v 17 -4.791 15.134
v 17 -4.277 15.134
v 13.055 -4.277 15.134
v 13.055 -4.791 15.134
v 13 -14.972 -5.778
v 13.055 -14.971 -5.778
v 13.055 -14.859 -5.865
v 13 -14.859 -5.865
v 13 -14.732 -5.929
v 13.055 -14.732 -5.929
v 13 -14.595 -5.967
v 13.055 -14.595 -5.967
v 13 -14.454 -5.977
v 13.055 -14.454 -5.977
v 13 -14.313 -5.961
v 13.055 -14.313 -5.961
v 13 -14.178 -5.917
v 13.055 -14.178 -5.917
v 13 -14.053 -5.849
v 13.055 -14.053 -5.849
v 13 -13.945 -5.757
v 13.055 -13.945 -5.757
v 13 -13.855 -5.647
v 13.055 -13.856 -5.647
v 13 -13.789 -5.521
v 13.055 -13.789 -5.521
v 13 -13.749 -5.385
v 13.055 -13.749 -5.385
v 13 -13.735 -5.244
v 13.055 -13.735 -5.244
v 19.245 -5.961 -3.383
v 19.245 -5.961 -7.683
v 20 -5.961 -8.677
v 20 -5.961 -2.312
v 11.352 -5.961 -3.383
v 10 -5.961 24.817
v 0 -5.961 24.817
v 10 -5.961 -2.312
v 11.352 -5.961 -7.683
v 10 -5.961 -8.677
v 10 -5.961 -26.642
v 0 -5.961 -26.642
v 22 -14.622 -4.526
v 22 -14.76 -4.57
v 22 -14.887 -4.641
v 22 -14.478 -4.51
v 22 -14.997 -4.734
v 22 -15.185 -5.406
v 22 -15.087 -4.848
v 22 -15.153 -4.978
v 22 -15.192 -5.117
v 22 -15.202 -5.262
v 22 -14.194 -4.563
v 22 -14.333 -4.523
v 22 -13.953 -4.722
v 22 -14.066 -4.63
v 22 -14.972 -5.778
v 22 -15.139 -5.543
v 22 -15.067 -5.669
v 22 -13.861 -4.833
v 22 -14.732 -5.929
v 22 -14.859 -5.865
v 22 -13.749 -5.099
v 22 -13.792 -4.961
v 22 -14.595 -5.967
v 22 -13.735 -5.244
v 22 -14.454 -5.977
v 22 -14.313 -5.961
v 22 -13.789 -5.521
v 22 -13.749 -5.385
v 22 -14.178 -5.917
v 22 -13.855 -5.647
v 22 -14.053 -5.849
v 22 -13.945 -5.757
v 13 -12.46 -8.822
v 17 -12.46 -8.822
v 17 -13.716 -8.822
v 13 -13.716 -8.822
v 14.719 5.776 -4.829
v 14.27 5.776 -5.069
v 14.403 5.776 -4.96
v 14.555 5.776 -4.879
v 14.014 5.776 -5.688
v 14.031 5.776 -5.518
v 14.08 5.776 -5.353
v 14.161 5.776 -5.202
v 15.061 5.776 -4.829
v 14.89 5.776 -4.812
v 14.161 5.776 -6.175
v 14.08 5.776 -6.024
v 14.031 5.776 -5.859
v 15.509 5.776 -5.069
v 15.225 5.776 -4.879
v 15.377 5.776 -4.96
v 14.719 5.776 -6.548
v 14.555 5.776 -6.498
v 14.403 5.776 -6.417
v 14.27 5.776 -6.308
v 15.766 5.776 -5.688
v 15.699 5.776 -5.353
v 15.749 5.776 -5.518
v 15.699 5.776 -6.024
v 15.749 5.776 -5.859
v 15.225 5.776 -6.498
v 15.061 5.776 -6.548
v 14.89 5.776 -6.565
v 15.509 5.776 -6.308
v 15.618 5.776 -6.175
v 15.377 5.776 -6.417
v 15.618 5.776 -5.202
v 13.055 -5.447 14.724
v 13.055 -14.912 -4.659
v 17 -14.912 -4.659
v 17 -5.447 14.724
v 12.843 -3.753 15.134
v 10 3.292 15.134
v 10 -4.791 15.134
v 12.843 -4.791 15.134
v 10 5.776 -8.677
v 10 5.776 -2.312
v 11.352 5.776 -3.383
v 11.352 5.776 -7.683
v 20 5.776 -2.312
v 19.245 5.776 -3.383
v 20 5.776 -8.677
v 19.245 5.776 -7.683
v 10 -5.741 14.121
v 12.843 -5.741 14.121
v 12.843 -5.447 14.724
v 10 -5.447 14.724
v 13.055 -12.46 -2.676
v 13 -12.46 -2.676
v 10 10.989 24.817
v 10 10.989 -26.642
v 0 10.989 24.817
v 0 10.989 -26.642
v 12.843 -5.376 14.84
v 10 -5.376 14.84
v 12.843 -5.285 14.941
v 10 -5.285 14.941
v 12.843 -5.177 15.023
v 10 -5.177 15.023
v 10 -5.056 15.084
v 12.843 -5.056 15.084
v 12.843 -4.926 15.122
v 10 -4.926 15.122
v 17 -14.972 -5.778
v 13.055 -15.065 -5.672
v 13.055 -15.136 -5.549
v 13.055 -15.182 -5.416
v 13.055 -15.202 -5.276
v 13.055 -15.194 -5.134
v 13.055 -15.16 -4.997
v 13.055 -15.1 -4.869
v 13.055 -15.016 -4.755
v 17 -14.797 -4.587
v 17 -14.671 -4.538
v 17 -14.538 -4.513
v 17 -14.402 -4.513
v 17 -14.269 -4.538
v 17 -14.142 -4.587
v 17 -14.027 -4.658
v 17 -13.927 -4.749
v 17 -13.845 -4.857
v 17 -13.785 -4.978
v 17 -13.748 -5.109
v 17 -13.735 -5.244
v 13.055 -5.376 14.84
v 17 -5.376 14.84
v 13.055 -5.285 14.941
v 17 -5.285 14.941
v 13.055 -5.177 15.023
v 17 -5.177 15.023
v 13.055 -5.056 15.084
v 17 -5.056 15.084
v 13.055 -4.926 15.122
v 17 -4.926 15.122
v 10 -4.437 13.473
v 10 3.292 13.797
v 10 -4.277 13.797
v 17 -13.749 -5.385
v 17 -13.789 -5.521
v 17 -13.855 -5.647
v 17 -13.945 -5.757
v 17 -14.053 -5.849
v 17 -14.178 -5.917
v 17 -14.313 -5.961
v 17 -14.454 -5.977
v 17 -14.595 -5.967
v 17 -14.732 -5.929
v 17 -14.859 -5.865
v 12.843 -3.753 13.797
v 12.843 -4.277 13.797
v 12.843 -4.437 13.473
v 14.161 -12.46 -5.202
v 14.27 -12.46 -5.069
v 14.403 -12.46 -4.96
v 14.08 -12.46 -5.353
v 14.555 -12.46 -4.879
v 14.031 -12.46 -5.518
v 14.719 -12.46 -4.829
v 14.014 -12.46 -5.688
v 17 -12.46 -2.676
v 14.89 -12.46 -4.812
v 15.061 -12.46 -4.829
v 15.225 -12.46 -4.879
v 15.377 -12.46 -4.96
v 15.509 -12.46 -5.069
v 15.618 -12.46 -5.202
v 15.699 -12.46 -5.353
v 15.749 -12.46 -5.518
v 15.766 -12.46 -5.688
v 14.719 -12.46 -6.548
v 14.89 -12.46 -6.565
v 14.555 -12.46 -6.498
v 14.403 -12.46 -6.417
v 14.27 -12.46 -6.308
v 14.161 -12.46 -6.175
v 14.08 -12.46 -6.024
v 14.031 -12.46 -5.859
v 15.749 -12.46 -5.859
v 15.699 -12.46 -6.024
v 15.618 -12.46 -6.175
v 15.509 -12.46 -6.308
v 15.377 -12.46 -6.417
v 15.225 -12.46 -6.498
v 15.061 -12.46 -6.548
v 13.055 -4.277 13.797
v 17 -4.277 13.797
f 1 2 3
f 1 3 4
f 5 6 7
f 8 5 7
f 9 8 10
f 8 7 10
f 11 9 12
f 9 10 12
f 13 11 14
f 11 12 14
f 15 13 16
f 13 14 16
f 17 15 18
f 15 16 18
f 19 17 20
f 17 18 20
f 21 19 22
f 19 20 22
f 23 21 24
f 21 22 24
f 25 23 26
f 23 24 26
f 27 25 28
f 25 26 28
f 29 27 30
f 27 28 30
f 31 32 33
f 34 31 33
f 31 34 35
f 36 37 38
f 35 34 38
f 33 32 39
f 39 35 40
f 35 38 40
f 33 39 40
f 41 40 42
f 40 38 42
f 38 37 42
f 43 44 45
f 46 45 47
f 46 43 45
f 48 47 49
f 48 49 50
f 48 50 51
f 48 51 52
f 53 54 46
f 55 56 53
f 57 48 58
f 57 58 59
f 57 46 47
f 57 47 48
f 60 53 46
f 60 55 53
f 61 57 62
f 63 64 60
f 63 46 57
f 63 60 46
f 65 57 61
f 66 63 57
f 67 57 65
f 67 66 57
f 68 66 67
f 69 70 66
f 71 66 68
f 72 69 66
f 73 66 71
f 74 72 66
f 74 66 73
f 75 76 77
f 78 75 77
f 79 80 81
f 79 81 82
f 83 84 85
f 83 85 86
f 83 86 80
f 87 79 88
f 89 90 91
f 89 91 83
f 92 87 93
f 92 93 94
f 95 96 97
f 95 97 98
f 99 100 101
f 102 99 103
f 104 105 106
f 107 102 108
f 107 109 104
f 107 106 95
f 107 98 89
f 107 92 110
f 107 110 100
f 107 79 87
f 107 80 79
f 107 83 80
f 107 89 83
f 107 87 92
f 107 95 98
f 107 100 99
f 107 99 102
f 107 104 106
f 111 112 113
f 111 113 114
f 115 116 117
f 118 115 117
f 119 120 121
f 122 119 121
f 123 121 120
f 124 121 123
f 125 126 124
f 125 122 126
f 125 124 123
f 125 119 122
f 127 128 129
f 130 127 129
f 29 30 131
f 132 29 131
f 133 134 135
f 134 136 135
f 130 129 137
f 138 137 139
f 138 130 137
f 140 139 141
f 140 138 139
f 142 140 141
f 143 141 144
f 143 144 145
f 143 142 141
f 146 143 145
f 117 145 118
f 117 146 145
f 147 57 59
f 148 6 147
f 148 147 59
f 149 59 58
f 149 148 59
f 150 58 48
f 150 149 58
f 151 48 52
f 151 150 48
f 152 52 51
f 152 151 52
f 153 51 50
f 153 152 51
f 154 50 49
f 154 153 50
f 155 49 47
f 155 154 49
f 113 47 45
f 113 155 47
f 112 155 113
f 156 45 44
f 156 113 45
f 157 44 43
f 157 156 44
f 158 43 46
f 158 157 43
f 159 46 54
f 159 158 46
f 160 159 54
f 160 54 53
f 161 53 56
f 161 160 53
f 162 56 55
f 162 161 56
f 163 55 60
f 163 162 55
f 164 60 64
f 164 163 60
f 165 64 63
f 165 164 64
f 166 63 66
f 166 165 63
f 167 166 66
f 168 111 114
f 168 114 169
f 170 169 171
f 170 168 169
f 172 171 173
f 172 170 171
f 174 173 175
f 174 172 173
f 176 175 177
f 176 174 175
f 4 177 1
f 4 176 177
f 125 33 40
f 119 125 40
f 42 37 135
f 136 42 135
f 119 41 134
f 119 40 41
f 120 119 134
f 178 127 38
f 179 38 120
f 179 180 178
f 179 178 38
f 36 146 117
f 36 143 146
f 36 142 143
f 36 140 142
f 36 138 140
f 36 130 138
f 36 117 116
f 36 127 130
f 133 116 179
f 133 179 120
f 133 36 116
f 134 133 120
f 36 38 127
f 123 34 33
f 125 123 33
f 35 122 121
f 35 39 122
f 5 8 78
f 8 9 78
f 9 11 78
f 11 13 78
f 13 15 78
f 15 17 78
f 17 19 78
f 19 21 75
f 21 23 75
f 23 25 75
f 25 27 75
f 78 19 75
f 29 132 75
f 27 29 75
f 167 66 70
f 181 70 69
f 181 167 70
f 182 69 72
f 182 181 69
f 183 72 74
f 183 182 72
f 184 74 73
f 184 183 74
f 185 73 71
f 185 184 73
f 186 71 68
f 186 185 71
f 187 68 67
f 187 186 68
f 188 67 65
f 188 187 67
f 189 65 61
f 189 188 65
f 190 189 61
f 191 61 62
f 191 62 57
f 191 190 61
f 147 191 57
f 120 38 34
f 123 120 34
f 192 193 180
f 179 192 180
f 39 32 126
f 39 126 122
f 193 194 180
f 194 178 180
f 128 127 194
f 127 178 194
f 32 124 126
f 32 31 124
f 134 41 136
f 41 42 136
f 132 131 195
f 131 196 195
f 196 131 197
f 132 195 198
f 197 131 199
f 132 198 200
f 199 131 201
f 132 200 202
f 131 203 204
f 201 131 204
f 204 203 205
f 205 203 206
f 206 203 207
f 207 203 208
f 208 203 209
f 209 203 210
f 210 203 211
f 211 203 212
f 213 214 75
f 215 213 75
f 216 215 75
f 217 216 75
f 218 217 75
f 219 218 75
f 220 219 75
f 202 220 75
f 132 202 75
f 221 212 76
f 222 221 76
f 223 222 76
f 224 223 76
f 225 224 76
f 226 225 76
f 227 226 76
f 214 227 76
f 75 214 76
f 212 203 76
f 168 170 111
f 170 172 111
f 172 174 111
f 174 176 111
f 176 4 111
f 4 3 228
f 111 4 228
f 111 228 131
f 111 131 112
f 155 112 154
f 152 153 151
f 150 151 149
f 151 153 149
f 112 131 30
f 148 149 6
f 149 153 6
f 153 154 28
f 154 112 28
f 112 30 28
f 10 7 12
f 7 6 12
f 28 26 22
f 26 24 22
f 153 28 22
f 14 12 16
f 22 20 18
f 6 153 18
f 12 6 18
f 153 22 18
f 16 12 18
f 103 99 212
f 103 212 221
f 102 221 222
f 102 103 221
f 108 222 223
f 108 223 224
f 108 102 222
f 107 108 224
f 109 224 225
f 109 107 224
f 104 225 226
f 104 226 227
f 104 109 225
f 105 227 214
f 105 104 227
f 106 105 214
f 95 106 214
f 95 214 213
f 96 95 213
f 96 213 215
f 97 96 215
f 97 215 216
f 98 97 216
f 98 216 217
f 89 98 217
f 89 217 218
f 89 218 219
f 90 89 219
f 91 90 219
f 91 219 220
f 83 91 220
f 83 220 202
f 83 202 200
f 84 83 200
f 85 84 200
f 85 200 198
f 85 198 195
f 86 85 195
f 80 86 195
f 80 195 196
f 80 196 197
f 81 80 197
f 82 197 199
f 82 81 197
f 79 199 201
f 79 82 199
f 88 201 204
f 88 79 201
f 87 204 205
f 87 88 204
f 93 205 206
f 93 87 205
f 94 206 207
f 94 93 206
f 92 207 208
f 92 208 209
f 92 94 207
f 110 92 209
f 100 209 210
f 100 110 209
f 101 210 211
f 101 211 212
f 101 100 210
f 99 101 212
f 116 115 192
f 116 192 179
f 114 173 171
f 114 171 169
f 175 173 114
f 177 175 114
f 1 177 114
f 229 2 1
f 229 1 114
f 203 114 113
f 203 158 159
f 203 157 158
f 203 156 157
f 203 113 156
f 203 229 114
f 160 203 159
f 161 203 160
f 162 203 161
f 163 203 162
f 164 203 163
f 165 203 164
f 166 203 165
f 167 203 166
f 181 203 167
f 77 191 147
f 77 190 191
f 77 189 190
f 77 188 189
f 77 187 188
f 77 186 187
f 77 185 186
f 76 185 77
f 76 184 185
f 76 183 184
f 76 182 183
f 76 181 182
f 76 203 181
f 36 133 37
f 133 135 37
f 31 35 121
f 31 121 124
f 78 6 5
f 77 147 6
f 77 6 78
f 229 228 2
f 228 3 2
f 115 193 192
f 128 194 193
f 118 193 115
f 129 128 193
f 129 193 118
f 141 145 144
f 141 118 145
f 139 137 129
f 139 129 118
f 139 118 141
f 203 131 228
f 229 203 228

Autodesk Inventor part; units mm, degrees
ref_plane "YZ Plane" through (0, 0, 0) normal (1, 0, 0) x (0, 1, 0)
ref_plane "XZ Plane" through (0, 0, 0) normal (0, 1, 0) x (-1, 0, 0)
ref_plane "XY Plane" through (0, 0, 0) normal (0, 0, 1) x (1, 0, 0)
sketch "Эскиз1" plane through (0, 0, 0) normal (1, 0, 0) x (0, 1, 0)
  line L0 (10.9892, 24.817) -> (-5.9609, 24.817)
  line L1 (-5.9609, 24.817) -> (-5.9609, -26.6418)
  line L2 (-5.9609, -26.6418) -> (10.9892, -26.6418)
  line L3 (10.9892, -26.6418) -> (10.9892, 24.817)
  point P0 (0, 0)
extrude "Выдавливание1" add sketch "Эскиз1" along normal blind 10
sketch "Эскиз2" plane through (10, 0, 0) normal (1, 0, 0) x (0, 0, -1)
  line L0 (-24.817, -5.9609) -> (26.6418, -5.9609) projected
  line L1 (8.6766, -5.9609) -> (2.3125, -5.9609)
  line L2 (2.3125, -5.9609) -> (2.3125, -4.2236)
  line L3 (2.3125, -4.2236) -> (8.6766, -4.2236)
  line L4 (8.6766, -4.2236) -> (8.6766, -5.9609)
  point P0 (0, 0)
extrude "Выдавливание2" add sketch "Эскиз2" along normal blind 10
sketch "Эскиз3" plane through (10, -4.2236, -2.3125) normal (0, 1, 0) x (1, 0, 0)
  line L0 (9.2453, 5.3703) -> (1.3522, 5.3703)
  line L1 (1.3522, 5.3703) -> (1.3522, 1.0702)
  line L2 (1.3522, 1.0702) -> (9.2453, 1.0702)
  line L3 (9.2453, 1.0702) -> (9.2453, 5.3703)
  point P0 (-10, -2.3125)
extrude "Выдавливание3" cut sketch "Эскиз3" against normal blind 10
sketch "Эскиз4" plane through (10, 0, 0) normal (1, 0, 0) x (0, 0, -1)
  circle A0 centre (-14.404, -4.7906) radius 0.7303
  circle A1 centre (5.2437, -14.4688) radius 0.7338
  line L0 (5.2437, -13.7349) -> (-14.0791, -4.1365)
  line L1 (4.6589, -14.9121) -> (-14.7245, -5.4468)
  point P0 (0, 0)
extrude "Выдавливание4" add sketch "Эскиз4" along normal blind 7
sketch "Эскиз5" plane through (10, -4.1365, 14.0791) normal (0, 0.8955929, -0.4448745) x (1, 0, 0)
  line L0 (0, 29.7403) -> (0, -16.3458) projected
  line L1 (0, 0.6764) -> (3.0548, 0.6764)
  line L2 (3.0548, 0.6764) -> (3.0548, 24.6626)
  line L3 (3.0548, 24.6626) -> (0, 24.6626)
  line L4 (0, 24.6626) -> (0, 0.6764)
  point P0 (-10, 10.7689)
  point P1 (0, 24.6626)
extrude "Выдавливание5" cut sketch "Эскиз5" against normal mid plane 10
sketch "Эскиз6" plane through (10, -4.2236, -2.3125) normal (0, 1, 0) x (1, 0, 0)
  circle A0 centre (4.8898, 3.376) radius 0.8761
  point P0 (-10, -2.3125)
extrude "Выдавливание6" add sketch "Эскиз6" along normal mid plane 20
sketch "Эскиз7" plane through (17, 0, 0) normal (1, 0, 0) x (0, 0, -1)
  point P0 (0, 0)
sketch "Эскиз8" plane through (10, -4.2236, -2.3125) normal (0, 1, 0) x (1, 0, 0)
  line L0 (10, 0) -> (10, 6.3641) projected
  line L1 (10, 6.3641) -> (0, 6.3641)
  line L2 (0, 6.3641) -> (0, 0)
  line L3 (0, 0) -> (10, 0)
  line L4 (10, 0) -> (10, 6.3641)
  line L5 (9.2453, 5.3703) -> (1.3522, 5.3703) projected
  line L6 (1.3522, 5.3703) -> (1.3522, 1.0702) projected
  line L7 (9.2453, 5.3703) -> (1.3522, 5.3703)
  line L8 (1.3522, 5.3703) -> (1.3522, 1.0702)
  line L9 (1.3522, 1.0702) -> (9.2453, 1.0702)
  line L10 (9.2453, 1.0702) -> (9.2453, 5.3703)
  point P0 (-10, -2.3125)
extrude "Выдавливание7" add sketch "Эскиз8" along normal blind 10
sketch "Эскиз11" plane through (17, 0, 0) normal (1, 0, 0) x (0, 0, -1)
  arc A0 (-14.0791, -4.1365) -> (-14.7245, -5.4468) centre (-14.404, -4.7906) ccw projected
  line L0 (-15.1343, -4.7906) -> (-13.7972, -4.7906)
  line L1 (-13.7972, -4.7906) -> (-13.7972, 3.2916)
  line L2 (-13.7972, 3.2916) -> (-15.1343, 3.2916)
  line L3 (-15.1343, 3.2916) -> (-15.1343, -4.7906)
  point P0 (0, 0)
extrude "Выдавливание8" add sketch "Эскиз11" against normal blind 10
sketch "Эскиз12" plane through (17, -4.7906, 15.1343) normal (0, 0, 1) x (1, 0, 0)
  line L0 (-7, 0.514) -> (0, 0.514) projected
  line L1 (0, 0.514) -> (-3.9452, 0.514)
  line L2 (-7, 8.0822) -> (-7, 0.514) projected
  line L3 (-3.9452, 0.514) -> (-7, 8.0822)
  line L4 (-7, 8.0822) -> (0, 8.0822)
  line L5 (-3.9452, 0.3531) -> (-7, 0.3531) projected
  line L6 (0, 0.514) -> (0, 8.0822) projected
  line L7 (0, 8.0822) -> (0, 0.514)
  line L8 (0, 0.514) -> (-3.9452, 0.514)
  point P0 (-17, 4.7906)
extrude "Выдавливание9" cut sketch "Эскиз12" against normal blind 10 contours L3 L4 L6 L0
sketch "Эскиз13" plane through (17, 0, 0) normal (1, 0, 0) x (0, 0, -1)
  line L0 (5.2437, -13.7349) -> (-13.4734, -4.4374) projected
  line L1 (2.6762, -12.4596) -> (8.8225, -12.4596)
  line L2 (8.8225, -12.4596) -> (8.8225, -14.9715)
  line L3 (8.8225, -14.9715) -> (2.6762, -14.9715)
  line L4 (2.6762, -14.9715) -> (2.6762, -12.4596)
  line L5 (-14.1211, -5.7414) -> (4.6589, -14.9121) projected
  line L6 (4.6589, -14.9121) -> (2.6762, -13.9439)
  arc A0 (4.6589, -14.9121) -> (5.2437, -13.7349) centre (5.2437, -14.4688) ccw projected
  line L7 (5.7783, -14.9715) -> (8.8225, -13.7155)
  point P0 (0, 0)
extrude "Выдавливание10" add sketch "Эскиз13" against normal blind 4 contours L0 L1 L2 L7 A0
sketch "Эскиз14" plane through (13.0548, -4.2766, 15.1343) normal (0, 1, 0) x (1, 0, 0)
  line L0 (0, 1.0132) -> (0, 19.7932) projected
  line L1 (0, 1.9544) -> (-0.2115, 1.9544)
  line L2 (-0.2115, 1.9544) -> (-0.2115, -0.5785)
  line L3 (-0.2115, -0.5785) -> (0, -0.5785)
  line L4 (0, -0.5785) -> (0, 1.9544)
  point P0 (-13.0548, 15.1343)
extrude "Выдавливание11" cut sketch "Эскиз14" along normal mid plane 10
sketch "Эскиз15" plane through (17, 0, 0) normal (1, 0, 0) x (0, 0, -1)
  arc A0 (5.7783, -14.9715) -> (5.2437, -13.7349) centre (5.2437, -14.4688) ccw projected
  circle A1 centre (5.2437, -14.4688) radius 0.7338
  point P0 (0, 0)
  point P1 (5.2437, -13.7349)
extrude "Выдавливание12" add sketch "Эскиз15" along normal blind 5
properties part number "пример подвески 1"
